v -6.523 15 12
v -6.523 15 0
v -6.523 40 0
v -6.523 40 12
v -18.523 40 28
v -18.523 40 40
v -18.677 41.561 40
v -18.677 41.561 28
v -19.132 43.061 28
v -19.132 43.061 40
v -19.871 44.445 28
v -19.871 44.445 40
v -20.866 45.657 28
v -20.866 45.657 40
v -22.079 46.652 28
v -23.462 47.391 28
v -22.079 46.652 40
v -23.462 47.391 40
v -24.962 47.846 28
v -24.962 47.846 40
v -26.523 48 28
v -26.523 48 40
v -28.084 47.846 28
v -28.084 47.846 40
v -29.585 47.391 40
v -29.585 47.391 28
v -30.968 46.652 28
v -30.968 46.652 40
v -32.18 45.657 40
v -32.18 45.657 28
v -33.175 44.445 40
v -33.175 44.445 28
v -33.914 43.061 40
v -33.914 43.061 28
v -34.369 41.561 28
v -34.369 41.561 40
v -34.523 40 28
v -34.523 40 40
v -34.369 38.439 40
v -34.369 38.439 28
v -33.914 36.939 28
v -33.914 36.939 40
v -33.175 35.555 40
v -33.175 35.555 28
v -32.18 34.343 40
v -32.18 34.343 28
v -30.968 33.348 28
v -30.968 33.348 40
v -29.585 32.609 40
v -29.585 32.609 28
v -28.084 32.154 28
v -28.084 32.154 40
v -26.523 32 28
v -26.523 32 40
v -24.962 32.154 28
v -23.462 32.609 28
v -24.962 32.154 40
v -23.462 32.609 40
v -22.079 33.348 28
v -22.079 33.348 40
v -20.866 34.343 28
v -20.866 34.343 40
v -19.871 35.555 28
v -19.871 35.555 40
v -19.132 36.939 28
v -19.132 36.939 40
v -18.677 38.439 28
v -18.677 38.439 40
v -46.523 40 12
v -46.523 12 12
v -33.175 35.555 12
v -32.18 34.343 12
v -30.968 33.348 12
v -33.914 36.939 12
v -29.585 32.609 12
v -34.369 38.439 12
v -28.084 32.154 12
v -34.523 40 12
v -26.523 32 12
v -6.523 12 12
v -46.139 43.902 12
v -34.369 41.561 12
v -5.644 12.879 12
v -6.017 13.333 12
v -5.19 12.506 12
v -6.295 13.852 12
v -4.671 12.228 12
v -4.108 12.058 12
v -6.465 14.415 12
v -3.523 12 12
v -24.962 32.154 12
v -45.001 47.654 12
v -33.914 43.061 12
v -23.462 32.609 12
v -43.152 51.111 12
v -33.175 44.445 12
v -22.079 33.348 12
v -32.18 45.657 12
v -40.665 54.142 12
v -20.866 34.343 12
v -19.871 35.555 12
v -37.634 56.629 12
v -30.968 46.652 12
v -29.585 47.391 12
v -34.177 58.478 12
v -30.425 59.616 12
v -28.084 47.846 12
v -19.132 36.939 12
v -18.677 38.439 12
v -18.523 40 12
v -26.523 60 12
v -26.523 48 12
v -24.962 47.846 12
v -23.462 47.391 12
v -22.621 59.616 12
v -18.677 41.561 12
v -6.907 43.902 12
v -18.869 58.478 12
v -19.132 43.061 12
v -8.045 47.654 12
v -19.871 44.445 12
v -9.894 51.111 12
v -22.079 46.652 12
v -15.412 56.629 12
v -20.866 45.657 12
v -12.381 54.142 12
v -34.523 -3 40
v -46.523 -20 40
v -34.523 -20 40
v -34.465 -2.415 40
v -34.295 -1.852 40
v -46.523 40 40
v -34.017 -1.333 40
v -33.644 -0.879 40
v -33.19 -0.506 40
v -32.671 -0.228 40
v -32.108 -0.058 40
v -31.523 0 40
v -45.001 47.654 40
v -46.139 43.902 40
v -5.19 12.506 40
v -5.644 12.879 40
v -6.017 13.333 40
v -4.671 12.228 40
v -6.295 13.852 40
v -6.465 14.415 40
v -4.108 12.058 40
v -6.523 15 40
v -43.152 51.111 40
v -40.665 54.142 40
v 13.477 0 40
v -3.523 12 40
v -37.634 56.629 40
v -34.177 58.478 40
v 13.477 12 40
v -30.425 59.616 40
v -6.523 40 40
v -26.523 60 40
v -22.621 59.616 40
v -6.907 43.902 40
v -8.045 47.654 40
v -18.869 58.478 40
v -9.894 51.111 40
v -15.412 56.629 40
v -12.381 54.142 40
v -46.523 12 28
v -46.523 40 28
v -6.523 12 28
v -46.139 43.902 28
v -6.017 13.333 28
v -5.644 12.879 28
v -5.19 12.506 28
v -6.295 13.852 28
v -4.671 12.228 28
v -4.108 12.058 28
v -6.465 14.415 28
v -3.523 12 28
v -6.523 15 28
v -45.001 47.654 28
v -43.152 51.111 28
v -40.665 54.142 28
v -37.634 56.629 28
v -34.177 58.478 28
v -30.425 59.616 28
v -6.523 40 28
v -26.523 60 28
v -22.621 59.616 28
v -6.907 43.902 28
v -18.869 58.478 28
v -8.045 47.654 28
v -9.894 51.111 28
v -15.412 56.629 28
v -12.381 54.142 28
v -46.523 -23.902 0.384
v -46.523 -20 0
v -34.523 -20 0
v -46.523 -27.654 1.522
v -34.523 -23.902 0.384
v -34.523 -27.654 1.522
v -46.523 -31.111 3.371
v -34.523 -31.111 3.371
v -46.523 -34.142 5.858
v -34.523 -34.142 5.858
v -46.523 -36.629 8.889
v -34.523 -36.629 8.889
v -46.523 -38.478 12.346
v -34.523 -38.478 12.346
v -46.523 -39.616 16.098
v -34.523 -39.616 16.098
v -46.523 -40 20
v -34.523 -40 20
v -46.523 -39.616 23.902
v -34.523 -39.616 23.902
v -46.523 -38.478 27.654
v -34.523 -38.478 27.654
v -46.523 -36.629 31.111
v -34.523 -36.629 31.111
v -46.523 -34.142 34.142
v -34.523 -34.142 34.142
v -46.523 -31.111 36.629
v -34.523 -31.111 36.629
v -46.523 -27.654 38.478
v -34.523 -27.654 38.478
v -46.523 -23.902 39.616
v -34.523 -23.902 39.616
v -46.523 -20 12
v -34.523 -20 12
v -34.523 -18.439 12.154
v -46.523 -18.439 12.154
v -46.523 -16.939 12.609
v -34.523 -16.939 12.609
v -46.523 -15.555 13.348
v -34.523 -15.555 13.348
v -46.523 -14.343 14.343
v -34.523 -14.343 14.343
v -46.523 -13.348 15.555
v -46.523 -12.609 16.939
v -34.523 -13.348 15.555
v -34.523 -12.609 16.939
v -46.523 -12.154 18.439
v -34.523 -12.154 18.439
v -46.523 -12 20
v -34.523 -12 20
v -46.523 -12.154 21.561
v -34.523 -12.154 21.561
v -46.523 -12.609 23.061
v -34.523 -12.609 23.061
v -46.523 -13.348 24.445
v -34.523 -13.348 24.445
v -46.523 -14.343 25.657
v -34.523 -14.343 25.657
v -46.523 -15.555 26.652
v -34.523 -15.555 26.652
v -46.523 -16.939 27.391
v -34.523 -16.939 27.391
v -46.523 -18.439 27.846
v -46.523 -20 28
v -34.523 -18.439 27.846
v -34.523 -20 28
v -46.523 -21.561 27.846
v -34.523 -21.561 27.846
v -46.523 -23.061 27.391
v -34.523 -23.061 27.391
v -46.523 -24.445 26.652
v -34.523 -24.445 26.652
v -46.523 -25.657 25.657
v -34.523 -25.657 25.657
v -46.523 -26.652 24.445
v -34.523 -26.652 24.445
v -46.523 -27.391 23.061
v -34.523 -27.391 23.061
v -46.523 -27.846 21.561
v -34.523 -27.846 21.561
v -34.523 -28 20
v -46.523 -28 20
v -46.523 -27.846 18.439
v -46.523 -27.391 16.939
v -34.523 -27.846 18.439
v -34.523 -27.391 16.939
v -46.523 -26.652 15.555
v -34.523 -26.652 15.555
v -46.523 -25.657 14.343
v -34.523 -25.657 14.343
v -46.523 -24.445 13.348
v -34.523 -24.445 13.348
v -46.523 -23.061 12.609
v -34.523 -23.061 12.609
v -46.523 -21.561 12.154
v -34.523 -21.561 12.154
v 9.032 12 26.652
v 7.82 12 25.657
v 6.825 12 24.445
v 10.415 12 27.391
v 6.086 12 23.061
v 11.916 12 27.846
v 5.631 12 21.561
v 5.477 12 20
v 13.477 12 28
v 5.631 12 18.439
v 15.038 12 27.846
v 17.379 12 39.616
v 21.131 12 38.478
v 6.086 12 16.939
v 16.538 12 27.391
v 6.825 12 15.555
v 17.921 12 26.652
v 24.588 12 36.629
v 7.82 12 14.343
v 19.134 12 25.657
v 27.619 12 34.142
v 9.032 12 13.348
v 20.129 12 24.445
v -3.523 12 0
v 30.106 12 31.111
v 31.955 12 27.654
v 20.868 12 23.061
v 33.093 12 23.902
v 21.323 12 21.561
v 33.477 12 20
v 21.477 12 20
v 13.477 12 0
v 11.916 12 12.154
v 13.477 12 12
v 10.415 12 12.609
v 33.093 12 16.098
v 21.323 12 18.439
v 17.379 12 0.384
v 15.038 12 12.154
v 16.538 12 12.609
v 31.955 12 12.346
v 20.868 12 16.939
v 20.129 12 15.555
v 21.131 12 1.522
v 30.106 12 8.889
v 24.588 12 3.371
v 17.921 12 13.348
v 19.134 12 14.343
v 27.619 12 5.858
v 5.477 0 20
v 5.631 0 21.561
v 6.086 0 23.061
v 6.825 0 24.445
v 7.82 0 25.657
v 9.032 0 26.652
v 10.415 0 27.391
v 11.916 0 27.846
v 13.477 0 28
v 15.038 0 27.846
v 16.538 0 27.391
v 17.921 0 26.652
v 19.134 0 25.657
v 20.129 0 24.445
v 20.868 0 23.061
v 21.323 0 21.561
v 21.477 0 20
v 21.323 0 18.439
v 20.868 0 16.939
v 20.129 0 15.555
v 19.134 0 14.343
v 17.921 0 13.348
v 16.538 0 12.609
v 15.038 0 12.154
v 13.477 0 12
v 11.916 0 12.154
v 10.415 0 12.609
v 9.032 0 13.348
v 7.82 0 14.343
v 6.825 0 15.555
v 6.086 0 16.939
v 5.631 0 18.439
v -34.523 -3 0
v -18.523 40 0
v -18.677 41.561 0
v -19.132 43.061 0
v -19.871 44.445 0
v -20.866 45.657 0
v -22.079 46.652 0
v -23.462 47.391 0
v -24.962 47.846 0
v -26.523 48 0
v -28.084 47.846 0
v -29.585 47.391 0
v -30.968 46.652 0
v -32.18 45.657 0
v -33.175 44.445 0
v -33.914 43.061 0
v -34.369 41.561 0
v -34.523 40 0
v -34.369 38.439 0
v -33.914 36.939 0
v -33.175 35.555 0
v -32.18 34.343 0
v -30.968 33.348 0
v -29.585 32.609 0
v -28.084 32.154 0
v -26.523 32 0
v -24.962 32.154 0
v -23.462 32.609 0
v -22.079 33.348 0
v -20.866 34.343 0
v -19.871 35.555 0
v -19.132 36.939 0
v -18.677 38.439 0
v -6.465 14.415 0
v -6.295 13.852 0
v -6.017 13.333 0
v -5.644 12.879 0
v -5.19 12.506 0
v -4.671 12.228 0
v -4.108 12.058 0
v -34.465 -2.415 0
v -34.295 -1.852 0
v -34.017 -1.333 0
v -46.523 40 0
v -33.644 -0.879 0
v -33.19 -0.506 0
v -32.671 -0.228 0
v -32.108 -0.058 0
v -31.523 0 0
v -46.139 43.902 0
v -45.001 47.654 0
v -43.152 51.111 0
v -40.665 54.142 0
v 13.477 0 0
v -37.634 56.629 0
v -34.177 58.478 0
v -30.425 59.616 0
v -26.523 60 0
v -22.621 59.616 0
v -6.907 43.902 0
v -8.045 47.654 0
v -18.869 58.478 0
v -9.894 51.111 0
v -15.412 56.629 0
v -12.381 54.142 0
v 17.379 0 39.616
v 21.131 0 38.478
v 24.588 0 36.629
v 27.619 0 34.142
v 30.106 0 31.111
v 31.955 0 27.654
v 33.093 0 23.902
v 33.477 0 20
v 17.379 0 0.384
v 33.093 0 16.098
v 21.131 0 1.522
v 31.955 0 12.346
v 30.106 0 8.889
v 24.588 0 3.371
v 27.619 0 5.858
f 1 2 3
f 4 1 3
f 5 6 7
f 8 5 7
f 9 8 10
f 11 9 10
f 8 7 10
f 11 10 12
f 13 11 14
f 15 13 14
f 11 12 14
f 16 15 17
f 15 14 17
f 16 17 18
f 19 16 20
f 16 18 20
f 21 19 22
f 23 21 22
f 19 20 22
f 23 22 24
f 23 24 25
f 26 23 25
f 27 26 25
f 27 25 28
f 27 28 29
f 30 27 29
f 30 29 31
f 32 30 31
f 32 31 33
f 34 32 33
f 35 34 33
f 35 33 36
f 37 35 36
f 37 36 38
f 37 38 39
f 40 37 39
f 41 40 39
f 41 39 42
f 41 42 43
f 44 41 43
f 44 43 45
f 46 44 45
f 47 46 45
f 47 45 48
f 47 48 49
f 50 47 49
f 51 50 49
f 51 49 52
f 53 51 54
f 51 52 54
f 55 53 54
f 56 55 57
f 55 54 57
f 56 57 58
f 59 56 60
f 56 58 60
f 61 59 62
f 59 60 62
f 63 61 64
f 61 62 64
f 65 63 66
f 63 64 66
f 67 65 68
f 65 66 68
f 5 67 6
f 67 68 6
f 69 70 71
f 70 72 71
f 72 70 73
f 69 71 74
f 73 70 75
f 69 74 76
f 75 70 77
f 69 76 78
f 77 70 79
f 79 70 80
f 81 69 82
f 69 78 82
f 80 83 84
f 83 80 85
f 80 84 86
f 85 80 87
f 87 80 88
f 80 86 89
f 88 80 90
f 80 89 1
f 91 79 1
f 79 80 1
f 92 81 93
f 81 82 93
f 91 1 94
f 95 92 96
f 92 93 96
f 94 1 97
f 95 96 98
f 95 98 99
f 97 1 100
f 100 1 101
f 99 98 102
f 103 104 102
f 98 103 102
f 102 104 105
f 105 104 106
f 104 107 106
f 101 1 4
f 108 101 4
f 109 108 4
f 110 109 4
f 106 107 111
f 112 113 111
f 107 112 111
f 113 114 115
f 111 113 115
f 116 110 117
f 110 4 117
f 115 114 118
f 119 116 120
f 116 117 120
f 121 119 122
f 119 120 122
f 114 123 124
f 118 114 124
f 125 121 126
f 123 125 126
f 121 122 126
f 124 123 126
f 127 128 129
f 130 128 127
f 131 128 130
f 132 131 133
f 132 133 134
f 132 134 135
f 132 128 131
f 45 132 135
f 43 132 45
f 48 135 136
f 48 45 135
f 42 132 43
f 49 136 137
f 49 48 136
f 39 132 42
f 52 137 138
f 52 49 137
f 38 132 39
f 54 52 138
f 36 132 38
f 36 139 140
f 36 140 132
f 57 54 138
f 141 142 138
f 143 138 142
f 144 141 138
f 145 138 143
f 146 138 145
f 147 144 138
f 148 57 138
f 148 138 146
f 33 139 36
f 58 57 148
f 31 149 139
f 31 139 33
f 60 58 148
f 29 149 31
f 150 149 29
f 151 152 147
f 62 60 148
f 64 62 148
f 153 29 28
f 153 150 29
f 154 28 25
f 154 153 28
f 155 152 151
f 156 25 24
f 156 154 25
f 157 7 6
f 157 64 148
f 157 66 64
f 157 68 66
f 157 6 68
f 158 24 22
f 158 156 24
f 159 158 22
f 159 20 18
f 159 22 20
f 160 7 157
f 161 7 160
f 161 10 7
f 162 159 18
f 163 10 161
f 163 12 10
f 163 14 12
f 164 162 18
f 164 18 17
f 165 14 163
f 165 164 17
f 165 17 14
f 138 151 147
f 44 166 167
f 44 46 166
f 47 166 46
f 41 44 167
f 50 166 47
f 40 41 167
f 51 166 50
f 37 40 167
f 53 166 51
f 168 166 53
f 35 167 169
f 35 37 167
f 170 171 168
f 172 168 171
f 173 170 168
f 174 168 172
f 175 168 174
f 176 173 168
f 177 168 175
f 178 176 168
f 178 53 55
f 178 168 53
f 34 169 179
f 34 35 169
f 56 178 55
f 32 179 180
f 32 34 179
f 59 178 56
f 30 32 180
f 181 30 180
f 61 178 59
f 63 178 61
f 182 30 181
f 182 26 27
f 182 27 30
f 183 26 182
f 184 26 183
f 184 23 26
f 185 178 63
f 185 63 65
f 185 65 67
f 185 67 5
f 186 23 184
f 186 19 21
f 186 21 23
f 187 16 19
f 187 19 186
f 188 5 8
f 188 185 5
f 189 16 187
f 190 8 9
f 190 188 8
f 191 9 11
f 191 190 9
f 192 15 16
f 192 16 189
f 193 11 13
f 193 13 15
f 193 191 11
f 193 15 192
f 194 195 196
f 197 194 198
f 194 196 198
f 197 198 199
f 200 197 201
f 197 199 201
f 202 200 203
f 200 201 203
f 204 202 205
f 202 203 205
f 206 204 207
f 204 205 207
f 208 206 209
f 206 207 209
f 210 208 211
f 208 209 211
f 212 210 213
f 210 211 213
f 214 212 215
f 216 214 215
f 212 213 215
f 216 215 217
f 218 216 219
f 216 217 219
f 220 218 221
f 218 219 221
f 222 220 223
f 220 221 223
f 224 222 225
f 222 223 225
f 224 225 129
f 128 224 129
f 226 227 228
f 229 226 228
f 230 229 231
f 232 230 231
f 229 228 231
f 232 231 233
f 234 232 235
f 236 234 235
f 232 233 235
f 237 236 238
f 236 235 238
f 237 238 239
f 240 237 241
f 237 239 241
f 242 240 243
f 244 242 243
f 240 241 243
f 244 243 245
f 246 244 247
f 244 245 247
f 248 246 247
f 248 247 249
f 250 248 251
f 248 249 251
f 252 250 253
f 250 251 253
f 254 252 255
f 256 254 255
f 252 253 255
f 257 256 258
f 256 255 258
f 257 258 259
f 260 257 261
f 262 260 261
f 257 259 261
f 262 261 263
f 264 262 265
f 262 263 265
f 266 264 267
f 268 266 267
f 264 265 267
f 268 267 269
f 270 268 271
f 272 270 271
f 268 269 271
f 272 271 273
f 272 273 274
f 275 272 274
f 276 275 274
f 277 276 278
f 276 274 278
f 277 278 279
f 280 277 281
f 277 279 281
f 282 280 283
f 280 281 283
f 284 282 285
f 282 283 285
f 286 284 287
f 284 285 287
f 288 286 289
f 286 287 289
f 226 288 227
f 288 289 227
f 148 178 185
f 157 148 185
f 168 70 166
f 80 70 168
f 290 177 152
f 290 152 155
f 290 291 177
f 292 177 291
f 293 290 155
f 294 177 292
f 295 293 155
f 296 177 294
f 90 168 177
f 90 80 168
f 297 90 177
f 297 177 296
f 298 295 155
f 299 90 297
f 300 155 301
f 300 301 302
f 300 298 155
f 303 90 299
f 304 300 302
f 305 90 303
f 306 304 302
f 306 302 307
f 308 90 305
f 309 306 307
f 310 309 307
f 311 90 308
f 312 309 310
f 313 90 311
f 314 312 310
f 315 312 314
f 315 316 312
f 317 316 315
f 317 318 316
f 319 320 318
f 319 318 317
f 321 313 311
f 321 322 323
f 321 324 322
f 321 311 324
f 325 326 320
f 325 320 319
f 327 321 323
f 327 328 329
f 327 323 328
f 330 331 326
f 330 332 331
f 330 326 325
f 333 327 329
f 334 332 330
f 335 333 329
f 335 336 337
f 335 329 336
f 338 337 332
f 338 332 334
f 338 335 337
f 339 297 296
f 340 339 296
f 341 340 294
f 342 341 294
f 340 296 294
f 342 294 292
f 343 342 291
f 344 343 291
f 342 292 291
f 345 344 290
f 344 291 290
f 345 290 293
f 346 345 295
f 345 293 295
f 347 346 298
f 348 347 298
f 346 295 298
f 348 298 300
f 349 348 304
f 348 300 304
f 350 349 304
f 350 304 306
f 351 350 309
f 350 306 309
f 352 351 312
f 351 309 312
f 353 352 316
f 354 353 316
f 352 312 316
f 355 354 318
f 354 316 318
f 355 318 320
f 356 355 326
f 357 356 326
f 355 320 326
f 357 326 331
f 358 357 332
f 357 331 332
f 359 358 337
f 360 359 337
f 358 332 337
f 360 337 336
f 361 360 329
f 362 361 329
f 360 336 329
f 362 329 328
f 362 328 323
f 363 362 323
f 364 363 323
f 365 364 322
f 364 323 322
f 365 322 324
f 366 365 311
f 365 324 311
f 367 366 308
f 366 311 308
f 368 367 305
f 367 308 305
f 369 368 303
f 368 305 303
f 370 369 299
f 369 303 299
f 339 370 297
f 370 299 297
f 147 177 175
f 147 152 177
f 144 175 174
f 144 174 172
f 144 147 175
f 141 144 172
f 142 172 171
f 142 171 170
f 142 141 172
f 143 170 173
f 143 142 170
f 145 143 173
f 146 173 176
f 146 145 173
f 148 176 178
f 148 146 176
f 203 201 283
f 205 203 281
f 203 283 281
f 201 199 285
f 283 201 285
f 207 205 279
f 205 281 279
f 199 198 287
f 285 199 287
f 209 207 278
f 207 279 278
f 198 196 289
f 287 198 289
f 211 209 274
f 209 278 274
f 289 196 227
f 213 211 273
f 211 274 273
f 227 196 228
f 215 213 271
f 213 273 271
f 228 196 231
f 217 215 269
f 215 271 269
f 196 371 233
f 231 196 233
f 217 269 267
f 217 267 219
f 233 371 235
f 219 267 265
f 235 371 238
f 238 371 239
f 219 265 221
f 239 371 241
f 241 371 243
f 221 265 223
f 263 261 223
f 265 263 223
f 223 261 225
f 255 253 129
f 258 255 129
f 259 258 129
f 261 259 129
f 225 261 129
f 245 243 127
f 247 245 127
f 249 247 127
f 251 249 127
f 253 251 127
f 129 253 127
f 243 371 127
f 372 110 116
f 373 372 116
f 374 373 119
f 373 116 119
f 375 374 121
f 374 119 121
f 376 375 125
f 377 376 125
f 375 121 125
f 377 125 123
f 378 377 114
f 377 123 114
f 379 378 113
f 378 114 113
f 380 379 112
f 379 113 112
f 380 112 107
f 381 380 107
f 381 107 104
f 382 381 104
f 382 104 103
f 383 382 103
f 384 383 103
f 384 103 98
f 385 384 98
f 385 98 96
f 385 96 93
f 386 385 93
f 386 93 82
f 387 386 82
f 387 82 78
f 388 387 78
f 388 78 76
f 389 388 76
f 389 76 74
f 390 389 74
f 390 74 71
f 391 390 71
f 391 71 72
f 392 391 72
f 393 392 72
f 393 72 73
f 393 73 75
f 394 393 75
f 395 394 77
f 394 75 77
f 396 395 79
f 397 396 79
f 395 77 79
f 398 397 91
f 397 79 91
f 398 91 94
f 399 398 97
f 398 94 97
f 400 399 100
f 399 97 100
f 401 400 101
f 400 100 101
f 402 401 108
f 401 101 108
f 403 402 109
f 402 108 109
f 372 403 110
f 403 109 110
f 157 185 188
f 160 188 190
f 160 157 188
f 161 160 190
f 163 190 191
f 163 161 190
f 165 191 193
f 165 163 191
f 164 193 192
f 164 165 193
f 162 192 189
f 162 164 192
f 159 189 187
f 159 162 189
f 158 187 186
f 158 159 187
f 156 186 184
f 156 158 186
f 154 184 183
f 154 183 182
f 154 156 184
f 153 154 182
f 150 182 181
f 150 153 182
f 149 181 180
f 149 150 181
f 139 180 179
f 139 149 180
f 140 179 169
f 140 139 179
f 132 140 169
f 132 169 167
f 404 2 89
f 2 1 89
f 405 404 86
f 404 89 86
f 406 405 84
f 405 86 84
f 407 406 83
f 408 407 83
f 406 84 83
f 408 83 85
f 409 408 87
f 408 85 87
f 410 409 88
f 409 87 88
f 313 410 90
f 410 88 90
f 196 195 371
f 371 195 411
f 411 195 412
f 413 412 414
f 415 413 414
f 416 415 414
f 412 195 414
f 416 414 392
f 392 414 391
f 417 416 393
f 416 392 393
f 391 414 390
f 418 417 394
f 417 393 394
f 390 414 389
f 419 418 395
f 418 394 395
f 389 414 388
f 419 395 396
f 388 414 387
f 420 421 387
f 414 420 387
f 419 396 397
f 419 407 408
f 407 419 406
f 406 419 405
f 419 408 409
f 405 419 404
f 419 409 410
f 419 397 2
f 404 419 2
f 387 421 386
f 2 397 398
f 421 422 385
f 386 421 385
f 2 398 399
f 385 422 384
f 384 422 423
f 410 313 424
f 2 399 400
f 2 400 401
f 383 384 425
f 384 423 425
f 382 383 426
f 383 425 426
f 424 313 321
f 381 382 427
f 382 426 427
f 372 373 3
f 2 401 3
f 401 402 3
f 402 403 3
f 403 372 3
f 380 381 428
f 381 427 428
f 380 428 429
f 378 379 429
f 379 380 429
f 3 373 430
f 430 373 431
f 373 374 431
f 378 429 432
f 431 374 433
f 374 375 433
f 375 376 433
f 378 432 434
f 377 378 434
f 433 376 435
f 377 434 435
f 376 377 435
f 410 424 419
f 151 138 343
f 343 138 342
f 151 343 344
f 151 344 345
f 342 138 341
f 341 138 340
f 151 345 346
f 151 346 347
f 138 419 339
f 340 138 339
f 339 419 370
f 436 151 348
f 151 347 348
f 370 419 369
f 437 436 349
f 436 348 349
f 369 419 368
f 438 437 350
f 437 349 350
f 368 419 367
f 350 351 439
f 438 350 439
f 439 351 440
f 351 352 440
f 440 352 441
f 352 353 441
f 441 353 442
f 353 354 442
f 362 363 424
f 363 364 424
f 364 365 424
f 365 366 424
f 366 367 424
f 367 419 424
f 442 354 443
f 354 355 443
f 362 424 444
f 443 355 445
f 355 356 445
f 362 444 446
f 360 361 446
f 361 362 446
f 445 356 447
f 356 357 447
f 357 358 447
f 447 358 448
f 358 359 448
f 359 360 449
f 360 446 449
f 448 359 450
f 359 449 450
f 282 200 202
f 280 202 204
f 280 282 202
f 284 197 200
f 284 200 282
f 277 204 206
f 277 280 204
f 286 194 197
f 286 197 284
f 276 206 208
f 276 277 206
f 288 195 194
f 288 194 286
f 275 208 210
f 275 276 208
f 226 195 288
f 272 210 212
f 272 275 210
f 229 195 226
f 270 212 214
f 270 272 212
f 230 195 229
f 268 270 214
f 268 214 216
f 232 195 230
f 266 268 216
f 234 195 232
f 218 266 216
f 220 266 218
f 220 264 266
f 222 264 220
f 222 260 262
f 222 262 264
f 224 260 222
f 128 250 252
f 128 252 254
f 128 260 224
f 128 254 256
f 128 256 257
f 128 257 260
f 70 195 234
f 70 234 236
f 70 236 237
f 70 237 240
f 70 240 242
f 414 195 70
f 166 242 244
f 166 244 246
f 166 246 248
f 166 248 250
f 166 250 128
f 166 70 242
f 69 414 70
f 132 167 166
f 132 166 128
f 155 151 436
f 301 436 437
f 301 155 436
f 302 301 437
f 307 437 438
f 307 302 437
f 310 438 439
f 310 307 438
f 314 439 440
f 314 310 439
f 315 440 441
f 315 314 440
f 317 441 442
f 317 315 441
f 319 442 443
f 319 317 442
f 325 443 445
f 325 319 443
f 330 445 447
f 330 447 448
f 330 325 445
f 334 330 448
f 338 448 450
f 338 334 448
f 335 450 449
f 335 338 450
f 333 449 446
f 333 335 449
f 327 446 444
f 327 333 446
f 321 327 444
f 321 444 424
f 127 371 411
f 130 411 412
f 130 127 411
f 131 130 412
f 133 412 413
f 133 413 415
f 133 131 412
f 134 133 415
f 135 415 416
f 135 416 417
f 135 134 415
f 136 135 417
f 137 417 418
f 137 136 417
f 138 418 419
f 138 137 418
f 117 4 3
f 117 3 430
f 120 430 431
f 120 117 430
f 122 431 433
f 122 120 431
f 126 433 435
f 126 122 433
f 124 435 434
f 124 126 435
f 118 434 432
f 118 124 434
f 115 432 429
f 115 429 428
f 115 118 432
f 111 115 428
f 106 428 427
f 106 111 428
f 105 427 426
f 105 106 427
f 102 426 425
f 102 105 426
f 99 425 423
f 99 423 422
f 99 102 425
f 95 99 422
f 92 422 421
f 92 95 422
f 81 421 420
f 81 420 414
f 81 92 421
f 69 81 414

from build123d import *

# Parameters (mm, degrees)
BOSS_EXTRUDE1_DEPTH = 40
BOSS_EXTRUDE2_DEPTH = 12
SKETCH4_R           = 8
CUT_EXTRUDE1_DEPTH  = 12
BOSS_EXTRUDE3_DEPTH = 12
SKETCH6_R           = 8
CUT_EXTRUDE2_DEPTH  = 12
BOSS_EXTRUDE4_DEPTH = 40
SKETCH9_R           = 8
CUT_EXTRUDE3_DEPTH  = 40
SKETCH10_W          = 16
SKETCH10_H          = 52.648113389
CUT_EXTRUDE4_DEPTH  = 62
FILLET1_R           = 3


with BuildPart() as part:
    # Sketch1 → Boss-Extrude1 (new body)
    with BuildSketch(Plane.XY):
        Polygon((-46.523076923, -20), (-34.523076923, -20), (-34.523076923, 0), (13.476923077, 0), (13.476923077, 12), (-6.523076923, 12), (-6.523076923, 40), (-46.523076923, 40), align=None)
    extrude(amount=BOSS_EXTRUDE1_DEPTH)

    # Sketch3 → Boss-Extrude2 (add)
    with BuildSketch(Plane(origin=(-34.523076923, 0, 0), x_dir=(0, 0, -1), z_dir=(1, 0, 0))):
        with BuildLine():
            Line((-40, -20), (0, -20))
            ThreePointArc((0, -20), (-20, -40), (-40, -20))
        make_face()
    extrude(amount=-BOSS_EXTRUDE2_DEPTH)

    # Sketch4 → Cut-Extrude1 (cut)
    with BuildSketch(Plane(origin=(-34.523076923, 0, 0), x_dir=(0, 0, -1), z_dir=(1, 0, 0))):
        with Locations((-20, -20)):
            Circle(SKETCH4_R)
    extrude(amount=-CUT_EXTRUDE1_DEPTH, mode=Mode.SUBTRACT)

    # Sketch5 → Boss-Extrude3 (add)
    with BuildSketch(Plane(origin=(0, 12, 0), x_dir=(1, 0, 0), z_dir=(0, 1, 0))):
        with BuildLine():
            Line((13.476923077, 0), (13.476923077, -40))
            ThreePointArc((13.476923077, -40), (33.476923077, -20), (13.476923077, 0))
        make_face()
    extrude(amount=-BOSS_EXTRUDE3_DEPTH)

    # Sketch6 → Cut-Extrude2 (cut)
    with BuildSketch(Plane(origin=(0, 12, 0), x_dir=(1, 0, 0), z_dir=(0, 1, 0))):
        with Locations(Location((13.476923077, -20, 0), (0, 0, 180))):
            Circle(SKETCH6_R)
    extrude(amount=-CUT_EXTRUDE2_DEPTH, mode=Mode.SUBTRACT)

    # Sketch8 → Boss-Extrude4 (add)
    with BuildSketch(Plane.XY.offset(40)):
        with BuildLine():
            Line((-46.523076923, 40), (-6.523076923, 40))
            ThreePointArc((-6.523076923, 40), (-26.523076923, 60), (-46.523076923, 40))
        make_face()
    extrude(amount=-BOSS_EXTRUDE4_DEPTH)

    # Sketch9 → Cut-Extrude3 (cut)
    with BuildSketch(Plane.XY.offset(40)):
        with Locations((-26.523076923, 40)):
            Circle(SKETCH9_R)
    extrude(amount=-CUT_EXTRUDE3_DEPTH, mode=Mode.SUBTRACT)

    # Sketch10 → Cut-Extrude4 (cut)
    with BuildSketch(Plane(origin=(-6.523076923, 0, 0), x_dir=(0, 0, -1), z_dir=(1, 0, 0))):
        with Locations((-20, 38.324056695)):
            Rectangle(SKETCH10_W, SKETCH10_H)
    extrude(amount=-CUT_EXTRUDE4_DEPTH, mode=Mode.SUBTRACT)

    # Fillet1
    fillet1_edges = [part.edges().sort_by_distance(p)[0] for p in [
        (-6.523076923, 12, 34),
        (-34.523076923, 0, 20),
        (-6.523076923, 12, 6),
    ]]
    fillet(fillet1_edges, radius=FILLET1_R)


solid = part.part
